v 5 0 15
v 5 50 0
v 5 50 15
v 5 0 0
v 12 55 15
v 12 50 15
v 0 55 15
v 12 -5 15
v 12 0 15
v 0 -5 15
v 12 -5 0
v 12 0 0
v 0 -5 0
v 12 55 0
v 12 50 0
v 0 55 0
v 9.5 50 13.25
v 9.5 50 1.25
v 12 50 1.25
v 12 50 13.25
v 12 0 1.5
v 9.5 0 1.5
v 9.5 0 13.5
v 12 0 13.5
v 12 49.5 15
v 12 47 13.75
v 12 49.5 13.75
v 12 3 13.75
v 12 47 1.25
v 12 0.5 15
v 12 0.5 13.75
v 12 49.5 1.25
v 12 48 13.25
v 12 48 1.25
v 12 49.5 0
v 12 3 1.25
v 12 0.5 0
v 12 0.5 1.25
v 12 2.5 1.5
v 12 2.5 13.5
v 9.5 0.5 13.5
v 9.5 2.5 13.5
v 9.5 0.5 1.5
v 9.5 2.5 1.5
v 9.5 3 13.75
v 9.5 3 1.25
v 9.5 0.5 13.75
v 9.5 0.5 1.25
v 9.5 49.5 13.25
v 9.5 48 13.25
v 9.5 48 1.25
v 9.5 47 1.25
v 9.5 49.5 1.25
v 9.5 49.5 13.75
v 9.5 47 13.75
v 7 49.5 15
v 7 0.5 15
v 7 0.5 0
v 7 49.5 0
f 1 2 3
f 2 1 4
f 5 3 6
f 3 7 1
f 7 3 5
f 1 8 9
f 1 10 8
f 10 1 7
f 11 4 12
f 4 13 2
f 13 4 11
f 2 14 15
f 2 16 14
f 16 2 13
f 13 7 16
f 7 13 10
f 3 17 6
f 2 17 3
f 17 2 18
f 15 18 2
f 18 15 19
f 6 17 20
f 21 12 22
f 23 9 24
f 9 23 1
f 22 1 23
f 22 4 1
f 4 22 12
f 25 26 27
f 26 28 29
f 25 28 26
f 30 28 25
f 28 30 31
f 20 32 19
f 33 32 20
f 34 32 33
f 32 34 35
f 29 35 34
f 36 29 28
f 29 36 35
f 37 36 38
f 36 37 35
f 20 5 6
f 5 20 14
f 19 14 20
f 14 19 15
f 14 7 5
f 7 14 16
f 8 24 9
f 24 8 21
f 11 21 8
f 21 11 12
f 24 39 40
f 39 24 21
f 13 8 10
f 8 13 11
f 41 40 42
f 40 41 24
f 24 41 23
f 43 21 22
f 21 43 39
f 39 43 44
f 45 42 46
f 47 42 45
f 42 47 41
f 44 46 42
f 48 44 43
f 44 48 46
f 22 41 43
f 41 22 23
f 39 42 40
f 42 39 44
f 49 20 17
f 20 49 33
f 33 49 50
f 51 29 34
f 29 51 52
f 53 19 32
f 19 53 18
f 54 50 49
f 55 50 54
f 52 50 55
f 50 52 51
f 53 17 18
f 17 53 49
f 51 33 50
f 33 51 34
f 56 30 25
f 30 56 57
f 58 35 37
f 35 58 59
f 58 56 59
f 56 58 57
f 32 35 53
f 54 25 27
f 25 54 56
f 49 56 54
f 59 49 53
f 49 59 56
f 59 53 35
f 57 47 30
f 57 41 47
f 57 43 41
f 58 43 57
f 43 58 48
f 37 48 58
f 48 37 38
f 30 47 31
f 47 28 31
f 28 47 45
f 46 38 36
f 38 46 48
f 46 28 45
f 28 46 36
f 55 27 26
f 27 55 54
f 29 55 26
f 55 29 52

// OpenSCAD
length = 50 ;
height = 15 ;
thickness = 5 ;
seatbelt_thickness = 2 ;
play = 0.5 ;
radius = 2 ;

module SeatBeltClip_Bracket()
{
	cube([thickness,length,height]);

	translate([0,length,0])
		cube([thickness*2+seatbelt_thickness,thickness,height]);

	translate([0,-thickness,0])
		cube([thickness*2+seatbelt_thickness,thickness,height]);

	translate([thickness*2+seatbelt_thickness-thickness/2,0,thickness/4+play/2])
		cube([thickness/2,thickness/2,height-thickness/2-play]) ;

	translate([thickness*2+seatbelt_thickness-thickness/2,length-thickness/2+play,thickness/4])
		cube([thickness/2,thickness/2,height-thickness/2-play]) ;

//	difference() {
//		cube(30, center = true);
//		sphere(20);
//	}
}

module SeatBeltClip_Bar()
{
	translate([thickness+seatbelt_thickness,0,0])
		difference() {
			translate([0,play,0])
	 			cube([thickness,length-play*2,height]) ;
			translate([thickness/2,0,thickness/4])
				cube([thickness/2,thickness/2+play,height-thickness/2]) ;
			translate([thickness/2,length-thickness/2-play,thickness/4])
				cube([thickness/2,thickness/2+play,height-thickness/2]) ;
		}
}

SeatBeltClip_Bracket();
SeatBeltClip_Bar();
